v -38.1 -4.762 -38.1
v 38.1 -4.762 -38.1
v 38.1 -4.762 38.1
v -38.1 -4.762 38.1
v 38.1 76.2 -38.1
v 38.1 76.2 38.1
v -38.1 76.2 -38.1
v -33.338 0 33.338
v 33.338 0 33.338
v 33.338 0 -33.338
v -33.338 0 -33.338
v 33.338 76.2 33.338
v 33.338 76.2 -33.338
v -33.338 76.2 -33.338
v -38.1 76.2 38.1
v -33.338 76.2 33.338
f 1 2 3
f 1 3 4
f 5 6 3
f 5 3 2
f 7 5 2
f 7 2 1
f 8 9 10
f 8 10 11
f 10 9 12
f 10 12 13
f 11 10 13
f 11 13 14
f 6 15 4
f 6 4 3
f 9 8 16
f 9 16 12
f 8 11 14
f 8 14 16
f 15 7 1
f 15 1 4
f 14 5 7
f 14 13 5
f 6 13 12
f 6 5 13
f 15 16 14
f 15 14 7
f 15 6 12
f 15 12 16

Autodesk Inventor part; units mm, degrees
ref_plane "YZ Plane" through (0, 0, 0) normal (1, 0, 0) x (0, 1, 0)
ref_plane "XZ Plane" through (0, 0, 0) normal (0, 1, 0) x (-1, 0, 0)
ref_plane "XY Plane" through (0, 0, 0) normal (0, 0, 1) x (1, 0, 0)
sketch "Sketch1" plane through (0, 0, 0) normal (0, 1, 0) x (-1, 0, 0)
  line L0 (-38.1, 38.1) -> (-38.1, -38.1)
  line L1 (-38.1, -38.1) -> (38.1, -38.1)
  line L2 (38.1, -38.1) -> (38.1, 38.1)
  line L3 (38.1, 38.1) -> (-38.1, 38.1)
  line L4 (-38.1, 38.1) -> (38.1, -38.1) construction
  line L5 (-38.1, -38.1) -> (38.1, 38.1) construction
  line L6 (-33.3375, 33.3375) -> (-33.3375, -33.3375)
  line L7 (-33.3375, -33.3375) -> (33.3375, -33.3375)
  line L8 (33.3375, -33.3375) -> (33.3375, 33.3375)
  line L9 (33.3375, 33.3375) -> (-33.3375, 33.3375)
  line L10 (-33.3375, 33.3375) -> (33.3375, -33.3375) construction
  line L11 (-33.3375, -33.3375) -> (33.3375, 33.3375) construction
  point P0 (0, 0)
  dimension "d0" = 76.2
  dimension "d1" = 4.7625
extrude "Extrusion1" add sketch "Sketch1" against normal blind 4.7625 contours L3 L2 L1 L0 | L9 L8 L7 L6
extrude "Extrusion2" add sketch "Sketch1" along normal blind 76.2
properties part number "squareMouseSupport"
